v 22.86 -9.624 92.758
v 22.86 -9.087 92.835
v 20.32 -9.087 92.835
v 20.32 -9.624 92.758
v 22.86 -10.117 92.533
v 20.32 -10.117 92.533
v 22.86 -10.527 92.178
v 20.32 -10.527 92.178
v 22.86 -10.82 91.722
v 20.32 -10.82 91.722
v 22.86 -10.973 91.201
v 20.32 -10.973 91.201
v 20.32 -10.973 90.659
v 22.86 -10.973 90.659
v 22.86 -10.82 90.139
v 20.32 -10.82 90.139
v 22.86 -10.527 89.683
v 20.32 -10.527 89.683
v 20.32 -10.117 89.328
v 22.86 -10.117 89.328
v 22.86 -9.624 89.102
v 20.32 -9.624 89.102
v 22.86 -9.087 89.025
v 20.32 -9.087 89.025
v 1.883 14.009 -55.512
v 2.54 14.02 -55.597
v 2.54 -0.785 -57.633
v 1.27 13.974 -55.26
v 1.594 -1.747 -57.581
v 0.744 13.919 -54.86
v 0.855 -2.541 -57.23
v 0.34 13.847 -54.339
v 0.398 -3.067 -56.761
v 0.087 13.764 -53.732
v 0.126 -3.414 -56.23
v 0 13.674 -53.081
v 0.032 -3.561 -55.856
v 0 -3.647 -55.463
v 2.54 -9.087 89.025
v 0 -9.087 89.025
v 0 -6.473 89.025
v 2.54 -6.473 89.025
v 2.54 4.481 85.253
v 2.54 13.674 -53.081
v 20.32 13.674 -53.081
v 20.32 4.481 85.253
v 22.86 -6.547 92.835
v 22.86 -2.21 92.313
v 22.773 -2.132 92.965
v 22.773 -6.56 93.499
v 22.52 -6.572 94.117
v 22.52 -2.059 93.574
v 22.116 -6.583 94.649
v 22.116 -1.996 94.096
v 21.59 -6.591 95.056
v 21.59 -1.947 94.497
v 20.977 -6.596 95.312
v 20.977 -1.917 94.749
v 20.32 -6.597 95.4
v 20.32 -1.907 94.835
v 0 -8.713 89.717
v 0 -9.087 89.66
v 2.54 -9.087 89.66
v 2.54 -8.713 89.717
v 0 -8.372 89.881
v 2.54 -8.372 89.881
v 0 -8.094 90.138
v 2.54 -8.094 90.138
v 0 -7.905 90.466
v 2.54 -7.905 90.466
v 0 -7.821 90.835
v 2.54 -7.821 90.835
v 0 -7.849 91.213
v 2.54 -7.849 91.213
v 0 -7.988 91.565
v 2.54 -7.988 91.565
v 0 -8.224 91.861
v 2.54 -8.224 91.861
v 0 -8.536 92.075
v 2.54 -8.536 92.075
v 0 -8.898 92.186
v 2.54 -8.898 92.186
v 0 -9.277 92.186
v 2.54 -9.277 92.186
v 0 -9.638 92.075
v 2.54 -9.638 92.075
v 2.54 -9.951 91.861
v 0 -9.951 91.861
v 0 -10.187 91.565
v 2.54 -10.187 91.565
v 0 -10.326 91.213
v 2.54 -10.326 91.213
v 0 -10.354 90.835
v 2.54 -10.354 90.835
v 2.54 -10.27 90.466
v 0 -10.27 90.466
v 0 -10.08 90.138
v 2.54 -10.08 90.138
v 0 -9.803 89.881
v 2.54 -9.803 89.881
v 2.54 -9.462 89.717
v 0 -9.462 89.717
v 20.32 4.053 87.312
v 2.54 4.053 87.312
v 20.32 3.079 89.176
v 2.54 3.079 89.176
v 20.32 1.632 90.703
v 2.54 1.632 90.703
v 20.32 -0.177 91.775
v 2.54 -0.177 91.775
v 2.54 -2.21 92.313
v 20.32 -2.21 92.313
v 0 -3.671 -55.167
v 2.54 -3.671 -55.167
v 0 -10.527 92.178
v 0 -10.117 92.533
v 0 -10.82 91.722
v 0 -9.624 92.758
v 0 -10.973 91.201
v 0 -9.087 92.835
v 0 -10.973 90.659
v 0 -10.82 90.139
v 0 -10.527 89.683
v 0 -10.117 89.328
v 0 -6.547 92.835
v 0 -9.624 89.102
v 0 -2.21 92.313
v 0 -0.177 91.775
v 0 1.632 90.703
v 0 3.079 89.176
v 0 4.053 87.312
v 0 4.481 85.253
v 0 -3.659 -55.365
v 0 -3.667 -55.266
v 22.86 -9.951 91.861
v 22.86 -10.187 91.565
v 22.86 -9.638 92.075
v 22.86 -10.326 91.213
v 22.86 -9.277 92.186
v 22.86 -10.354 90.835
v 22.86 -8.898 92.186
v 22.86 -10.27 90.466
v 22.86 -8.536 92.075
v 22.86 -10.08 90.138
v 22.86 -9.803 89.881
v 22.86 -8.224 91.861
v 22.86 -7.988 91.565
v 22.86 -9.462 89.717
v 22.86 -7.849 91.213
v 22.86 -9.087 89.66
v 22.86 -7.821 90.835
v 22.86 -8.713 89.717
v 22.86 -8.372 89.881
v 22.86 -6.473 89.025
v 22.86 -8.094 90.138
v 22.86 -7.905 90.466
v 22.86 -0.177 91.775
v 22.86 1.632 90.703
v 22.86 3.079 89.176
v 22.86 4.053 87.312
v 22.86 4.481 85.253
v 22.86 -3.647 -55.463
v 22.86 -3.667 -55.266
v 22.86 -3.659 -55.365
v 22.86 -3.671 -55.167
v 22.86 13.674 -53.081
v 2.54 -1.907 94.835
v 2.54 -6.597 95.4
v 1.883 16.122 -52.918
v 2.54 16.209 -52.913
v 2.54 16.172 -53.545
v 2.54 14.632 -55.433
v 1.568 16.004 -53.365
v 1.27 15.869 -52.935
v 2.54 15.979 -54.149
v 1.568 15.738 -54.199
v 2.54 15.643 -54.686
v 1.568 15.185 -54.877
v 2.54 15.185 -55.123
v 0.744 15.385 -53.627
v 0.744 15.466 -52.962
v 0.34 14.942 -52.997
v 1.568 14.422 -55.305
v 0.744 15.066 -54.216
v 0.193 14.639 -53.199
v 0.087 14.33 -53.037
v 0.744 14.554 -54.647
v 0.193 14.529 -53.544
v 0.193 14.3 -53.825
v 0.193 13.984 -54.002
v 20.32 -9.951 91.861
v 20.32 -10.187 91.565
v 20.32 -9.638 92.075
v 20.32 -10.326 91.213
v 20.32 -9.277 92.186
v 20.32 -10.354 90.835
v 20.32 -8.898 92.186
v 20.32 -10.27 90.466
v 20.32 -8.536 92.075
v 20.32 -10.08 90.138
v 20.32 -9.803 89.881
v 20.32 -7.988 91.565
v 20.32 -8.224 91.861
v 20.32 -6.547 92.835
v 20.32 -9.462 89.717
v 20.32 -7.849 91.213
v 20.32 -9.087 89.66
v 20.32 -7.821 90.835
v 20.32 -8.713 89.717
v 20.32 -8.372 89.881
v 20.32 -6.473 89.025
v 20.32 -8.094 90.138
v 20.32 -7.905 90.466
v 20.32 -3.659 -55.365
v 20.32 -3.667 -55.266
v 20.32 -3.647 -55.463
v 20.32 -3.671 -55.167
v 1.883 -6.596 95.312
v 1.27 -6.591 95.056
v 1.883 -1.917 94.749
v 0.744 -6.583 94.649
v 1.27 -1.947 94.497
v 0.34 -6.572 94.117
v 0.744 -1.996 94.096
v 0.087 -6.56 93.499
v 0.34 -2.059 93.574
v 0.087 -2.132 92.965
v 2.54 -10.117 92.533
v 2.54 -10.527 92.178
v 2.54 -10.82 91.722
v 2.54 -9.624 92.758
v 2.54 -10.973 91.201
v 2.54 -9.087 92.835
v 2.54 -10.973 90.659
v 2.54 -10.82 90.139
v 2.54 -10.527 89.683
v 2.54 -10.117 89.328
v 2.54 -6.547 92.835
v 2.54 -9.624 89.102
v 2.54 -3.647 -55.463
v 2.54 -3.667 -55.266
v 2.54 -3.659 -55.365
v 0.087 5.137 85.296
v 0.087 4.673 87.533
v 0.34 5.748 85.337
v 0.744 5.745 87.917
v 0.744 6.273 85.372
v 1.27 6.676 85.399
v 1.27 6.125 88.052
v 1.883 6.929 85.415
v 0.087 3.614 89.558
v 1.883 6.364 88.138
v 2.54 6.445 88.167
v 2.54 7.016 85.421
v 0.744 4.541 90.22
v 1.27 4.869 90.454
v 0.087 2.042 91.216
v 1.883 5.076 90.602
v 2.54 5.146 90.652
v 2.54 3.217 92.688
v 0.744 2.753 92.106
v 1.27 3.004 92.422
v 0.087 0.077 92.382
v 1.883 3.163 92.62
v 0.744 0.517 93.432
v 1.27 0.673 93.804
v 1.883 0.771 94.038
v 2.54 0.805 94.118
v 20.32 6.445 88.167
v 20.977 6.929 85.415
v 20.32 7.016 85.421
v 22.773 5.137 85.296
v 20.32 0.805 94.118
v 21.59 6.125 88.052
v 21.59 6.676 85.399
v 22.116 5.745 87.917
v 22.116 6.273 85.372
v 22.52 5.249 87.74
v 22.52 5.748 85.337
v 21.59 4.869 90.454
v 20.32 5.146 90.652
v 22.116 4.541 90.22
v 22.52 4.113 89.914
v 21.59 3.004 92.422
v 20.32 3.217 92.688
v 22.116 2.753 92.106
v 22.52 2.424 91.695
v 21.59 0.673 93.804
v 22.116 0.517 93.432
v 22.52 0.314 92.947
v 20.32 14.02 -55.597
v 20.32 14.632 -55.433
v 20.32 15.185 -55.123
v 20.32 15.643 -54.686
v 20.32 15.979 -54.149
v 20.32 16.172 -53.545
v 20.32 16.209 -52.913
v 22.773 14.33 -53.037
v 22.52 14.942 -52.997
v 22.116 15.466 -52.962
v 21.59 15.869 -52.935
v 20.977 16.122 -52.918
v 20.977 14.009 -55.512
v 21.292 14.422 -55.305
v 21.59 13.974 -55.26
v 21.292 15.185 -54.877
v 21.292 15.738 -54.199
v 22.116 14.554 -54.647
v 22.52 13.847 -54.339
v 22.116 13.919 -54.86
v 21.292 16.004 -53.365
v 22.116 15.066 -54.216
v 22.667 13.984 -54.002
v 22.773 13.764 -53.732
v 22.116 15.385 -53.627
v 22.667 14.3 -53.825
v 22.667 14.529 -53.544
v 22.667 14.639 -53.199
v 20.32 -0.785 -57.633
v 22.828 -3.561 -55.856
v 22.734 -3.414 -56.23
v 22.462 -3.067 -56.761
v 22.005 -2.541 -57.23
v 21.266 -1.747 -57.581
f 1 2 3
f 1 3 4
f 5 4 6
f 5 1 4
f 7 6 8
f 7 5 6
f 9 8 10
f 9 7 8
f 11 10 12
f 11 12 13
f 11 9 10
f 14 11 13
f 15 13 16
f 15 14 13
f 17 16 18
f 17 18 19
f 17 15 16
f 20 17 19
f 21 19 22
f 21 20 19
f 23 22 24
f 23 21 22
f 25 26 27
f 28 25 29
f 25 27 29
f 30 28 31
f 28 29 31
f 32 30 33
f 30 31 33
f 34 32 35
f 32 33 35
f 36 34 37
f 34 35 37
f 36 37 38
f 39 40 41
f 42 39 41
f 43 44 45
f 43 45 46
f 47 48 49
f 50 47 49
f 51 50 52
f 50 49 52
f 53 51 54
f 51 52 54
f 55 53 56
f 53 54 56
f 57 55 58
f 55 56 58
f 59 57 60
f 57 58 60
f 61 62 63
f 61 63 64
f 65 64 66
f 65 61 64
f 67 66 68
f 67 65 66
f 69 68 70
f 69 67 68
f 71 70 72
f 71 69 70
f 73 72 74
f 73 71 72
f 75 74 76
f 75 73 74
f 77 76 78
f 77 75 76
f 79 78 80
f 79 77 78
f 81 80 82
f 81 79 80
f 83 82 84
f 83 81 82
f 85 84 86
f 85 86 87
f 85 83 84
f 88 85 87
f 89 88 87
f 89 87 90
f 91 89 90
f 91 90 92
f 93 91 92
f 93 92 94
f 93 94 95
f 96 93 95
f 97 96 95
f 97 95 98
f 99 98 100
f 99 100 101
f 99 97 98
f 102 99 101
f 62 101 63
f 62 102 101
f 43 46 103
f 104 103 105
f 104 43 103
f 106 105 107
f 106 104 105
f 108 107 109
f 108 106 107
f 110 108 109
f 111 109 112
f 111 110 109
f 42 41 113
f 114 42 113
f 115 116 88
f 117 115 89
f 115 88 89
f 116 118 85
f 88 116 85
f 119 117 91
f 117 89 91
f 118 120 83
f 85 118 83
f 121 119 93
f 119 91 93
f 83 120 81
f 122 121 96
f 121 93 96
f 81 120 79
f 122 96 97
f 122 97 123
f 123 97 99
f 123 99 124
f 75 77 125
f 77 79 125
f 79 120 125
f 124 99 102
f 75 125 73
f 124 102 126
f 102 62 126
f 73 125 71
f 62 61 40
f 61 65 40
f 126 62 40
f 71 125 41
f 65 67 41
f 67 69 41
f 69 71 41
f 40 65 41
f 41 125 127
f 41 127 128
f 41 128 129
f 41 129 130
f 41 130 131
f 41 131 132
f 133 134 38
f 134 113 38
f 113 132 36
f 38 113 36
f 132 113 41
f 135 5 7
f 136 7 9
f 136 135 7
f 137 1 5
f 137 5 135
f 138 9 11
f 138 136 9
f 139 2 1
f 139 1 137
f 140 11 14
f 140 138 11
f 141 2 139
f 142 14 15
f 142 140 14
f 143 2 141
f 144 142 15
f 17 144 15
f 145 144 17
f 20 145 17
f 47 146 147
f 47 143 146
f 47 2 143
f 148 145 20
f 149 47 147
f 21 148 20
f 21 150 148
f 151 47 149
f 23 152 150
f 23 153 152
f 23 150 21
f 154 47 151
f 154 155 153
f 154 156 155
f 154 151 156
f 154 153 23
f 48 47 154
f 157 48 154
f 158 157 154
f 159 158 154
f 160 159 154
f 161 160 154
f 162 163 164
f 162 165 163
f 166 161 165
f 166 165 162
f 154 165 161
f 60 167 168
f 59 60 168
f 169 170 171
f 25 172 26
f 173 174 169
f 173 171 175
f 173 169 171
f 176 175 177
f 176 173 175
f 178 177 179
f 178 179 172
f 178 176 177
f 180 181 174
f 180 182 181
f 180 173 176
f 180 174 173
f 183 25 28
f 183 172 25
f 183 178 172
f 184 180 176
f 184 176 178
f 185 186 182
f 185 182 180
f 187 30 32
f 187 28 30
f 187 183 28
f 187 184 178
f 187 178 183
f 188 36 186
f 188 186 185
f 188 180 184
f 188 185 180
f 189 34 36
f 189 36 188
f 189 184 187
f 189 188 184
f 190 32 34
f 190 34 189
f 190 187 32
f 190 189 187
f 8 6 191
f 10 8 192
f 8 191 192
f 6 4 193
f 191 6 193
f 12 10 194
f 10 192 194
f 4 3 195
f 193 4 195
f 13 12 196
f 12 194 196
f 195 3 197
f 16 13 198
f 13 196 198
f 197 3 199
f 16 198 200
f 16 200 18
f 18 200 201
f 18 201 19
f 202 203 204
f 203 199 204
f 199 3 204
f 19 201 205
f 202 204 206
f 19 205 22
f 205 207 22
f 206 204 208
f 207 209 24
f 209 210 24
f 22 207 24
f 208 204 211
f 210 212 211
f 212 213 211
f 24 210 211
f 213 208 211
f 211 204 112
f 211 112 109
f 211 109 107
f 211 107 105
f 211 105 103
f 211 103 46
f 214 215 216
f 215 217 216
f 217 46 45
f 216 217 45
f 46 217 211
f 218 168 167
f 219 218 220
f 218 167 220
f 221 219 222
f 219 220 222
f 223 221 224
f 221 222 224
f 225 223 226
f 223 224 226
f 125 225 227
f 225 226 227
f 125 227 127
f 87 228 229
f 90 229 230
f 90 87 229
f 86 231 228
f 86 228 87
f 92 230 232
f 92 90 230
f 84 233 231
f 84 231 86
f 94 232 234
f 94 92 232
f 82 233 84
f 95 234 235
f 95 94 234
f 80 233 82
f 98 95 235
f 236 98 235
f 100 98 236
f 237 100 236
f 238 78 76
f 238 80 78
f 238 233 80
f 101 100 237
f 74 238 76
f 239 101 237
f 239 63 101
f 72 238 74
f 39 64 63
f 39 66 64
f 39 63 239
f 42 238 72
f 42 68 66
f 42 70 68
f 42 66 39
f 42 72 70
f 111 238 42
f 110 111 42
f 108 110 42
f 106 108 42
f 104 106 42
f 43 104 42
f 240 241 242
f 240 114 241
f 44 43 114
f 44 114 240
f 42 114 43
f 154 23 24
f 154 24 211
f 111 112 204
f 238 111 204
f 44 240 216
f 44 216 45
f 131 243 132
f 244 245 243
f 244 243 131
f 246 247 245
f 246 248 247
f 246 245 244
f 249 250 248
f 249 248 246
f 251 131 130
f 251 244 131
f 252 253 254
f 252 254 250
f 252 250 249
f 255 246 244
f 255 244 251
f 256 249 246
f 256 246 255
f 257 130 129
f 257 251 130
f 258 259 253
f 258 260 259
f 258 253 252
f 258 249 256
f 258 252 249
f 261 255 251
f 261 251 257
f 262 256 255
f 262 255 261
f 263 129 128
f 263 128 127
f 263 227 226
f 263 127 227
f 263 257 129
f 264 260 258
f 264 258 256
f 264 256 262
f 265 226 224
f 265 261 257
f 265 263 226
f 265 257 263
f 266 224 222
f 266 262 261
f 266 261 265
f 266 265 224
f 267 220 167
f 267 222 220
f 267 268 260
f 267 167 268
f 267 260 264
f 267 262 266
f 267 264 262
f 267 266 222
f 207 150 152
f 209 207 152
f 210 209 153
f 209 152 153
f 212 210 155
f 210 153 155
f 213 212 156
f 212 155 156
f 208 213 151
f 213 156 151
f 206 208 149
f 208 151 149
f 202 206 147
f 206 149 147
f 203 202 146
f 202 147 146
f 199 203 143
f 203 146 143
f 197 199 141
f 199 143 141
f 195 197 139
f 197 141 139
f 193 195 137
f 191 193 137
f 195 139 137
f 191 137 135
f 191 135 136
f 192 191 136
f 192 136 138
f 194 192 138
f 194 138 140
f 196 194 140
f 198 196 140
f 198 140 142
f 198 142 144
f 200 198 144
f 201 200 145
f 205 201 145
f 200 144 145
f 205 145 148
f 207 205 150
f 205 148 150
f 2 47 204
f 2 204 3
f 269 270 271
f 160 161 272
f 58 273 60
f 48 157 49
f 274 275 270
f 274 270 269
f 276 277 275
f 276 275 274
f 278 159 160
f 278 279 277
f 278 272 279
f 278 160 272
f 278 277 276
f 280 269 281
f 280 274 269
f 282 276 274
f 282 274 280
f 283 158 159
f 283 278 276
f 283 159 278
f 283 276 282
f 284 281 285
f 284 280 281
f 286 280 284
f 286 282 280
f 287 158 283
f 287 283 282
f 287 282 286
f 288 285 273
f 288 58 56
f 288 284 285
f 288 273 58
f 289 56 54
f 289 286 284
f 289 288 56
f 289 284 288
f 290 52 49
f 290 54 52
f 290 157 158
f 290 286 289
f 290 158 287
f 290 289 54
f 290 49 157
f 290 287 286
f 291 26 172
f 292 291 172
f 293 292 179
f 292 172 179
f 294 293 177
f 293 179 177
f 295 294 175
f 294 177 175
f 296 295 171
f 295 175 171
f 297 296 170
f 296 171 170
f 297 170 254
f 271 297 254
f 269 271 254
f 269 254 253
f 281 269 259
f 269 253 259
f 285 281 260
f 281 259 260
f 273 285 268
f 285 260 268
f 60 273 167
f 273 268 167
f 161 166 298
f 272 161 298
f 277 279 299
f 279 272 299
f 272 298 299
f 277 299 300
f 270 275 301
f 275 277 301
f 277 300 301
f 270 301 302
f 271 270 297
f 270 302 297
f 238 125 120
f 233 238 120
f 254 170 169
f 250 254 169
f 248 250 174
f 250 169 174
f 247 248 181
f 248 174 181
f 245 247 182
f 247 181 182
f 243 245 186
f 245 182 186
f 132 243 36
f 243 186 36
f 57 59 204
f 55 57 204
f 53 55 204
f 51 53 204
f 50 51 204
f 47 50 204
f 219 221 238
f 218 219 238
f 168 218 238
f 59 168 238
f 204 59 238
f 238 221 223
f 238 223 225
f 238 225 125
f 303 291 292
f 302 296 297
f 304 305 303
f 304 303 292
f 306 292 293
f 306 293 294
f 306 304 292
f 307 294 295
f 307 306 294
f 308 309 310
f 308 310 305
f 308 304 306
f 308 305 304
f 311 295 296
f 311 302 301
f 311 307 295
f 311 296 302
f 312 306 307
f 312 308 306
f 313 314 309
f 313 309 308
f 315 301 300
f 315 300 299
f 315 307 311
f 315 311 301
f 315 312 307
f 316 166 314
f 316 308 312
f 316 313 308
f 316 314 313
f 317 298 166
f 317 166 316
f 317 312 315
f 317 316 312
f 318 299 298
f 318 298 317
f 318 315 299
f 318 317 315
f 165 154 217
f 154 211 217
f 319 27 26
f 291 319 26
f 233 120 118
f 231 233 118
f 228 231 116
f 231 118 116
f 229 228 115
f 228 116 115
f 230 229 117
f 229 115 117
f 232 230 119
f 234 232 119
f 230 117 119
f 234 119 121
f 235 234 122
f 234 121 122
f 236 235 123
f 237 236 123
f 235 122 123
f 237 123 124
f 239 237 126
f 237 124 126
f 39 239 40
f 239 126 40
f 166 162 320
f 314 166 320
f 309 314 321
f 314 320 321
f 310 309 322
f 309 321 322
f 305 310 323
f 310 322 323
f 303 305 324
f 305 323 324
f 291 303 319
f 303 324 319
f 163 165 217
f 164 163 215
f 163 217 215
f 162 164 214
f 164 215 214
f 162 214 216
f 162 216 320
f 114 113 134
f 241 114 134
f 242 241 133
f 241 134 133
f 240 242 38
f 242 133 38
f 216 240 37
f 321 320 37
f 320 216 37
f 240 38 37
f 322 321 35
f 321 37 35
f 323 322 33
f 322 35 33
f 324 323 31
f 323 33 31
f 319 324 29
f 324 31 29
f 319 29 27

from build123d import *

# Parameters (mm, degrees)
BOSS_EXTRUDE1_DEPTH = 22.86
SHELL3_T            = -2.54
SKETCH2_R           = 1.27
BOSS_EXTRUDE2_DEPTH = 2.54
FILLET2_R           = 2.54


with BuildPart() as part:
    # Sketch1 → Boss-Extrude1 (new body)
    with BuildSketch(Plane(origin=(0, 0, 0), x_dir=(0, 0, -1), z_dir=(1, 0, 0))):
        with BuildLine():
            Line((-95.3996828, -6.597201831), (58.022669589, -3.615128074))
            Line((58.022669589, -3.615128074), (55.274818438, 16.365717982))
            Line((55.274818438, 16.365717982), (-85.421209368, 7.015665501))
            ThreePointArc((-85.421209368, 7.015665501), (-91.73681654, 4.25197608), (-94.834557989, -1.906665904))
            Line((-94.834557989, -1.906665904), (-95.3996828, -6.597201831))
        make_face()
    extrude(amount=BOSS_EXTRUDE1_DEPTH)

    # Shell3
    shell3_openings = [part.faces().sort_by_distance(p)[0] for p in [
        (11.43, -5.106164953, 18.688506605),
    ]]
    offset(amount=SHELL3_T, openings=shell3_openings, kind=Kind.INTERSECTION)

    # Sketch2 → Boss-Extrude2 (add)
    with BuildSketch(Plane(origin=(22.86, 0, 0), x_dir=(0, 0, -1), z_dir=(1, 0, 0))):
        with BuildLine():
            Line((-89.025308756, -6.473302977), (-92.835308756, -6.547358034))
            Line((-92.835308756, -6.547358034), (-92.835308756, -9.087358034))
            ThreePointArc((-92.835308756, -9.087358034), (-90.930308756, -10.992358034), (-89.025308756, -9.087358034))
            Line((-89.025308756, -9.087358034), (-89.025308756, -6.473302977))
        make_face()
        with Locations((-90.930308756, -9.087358034)):
            Circle(SKETCH2_R, mode=Mode.SUBTRACT)
    boss_extrude2 = extrude(amount=-BOSS_EXTRUDE2_DEPTH)

    # Mirror1: Boss-Extrude2 across plane
    add(boss_extrude2.mirror(Plane.ZY.offset(-11.43)))

    # Fillet2
    # the kernel refuses this fillet: 2.54 mm, written as the material it takes off along each edge
    with BuildSketch(Plane(origin=(2.54, 13.674326521, -53.081043163), x_dir=(0, 0.1362419322973002, -0.9906755956840251), z_dir=(-1, 0, 0))) as fillet2_piece_1_section:
        Polygon((0, 0), (FILLET2_R, 0), (FILLET2_R, -FILLET2_R * 0.932051833184), (FILLET2_R * 0.0702509400666, -FILLET2_R * 0.997529350656), align=None)
    fillet2_piece_1 = extrude(amount=FILLET2_R, mode=Mode.PRIVATE)
    fillet2_piece_1 = fillet2_piece_1 - Plane(origin=(2.54, 13.674326521, -53.081043163), x_dir=(0, -0.7751236084755375, 0.6318096165648808), z_dir=(-1, 0, 0)) * Sphere(FILLET2_R, mode=Mode.PRIVATE)
    add(fillet2_piece_1, mode=Mode.SUBTRACT)
    with BuildSketch(Plane(origin=(20.32, 13.674326521, -53.081043163), x_dir=(0, 0.1362419322973002, -0.9906755956840251), z_dir=(1, 0, 0))) as fillet2_piece_2_section:
        Polygon((0, 0), (FILLET2_R, 0), (FILLET2_R, FILLET2_R * 0.932051833184), (FILLET2_R * 0.0702509400666, FILLET2_R * 0.997529350656), align=None)
    fillet2_piece_2 = extrude(amount=FILLET2_R, mode=Mode.PRIVATE)
    fillet2_piece_2 = fillet2_piece_2 - Plane(origin=(20.32, 13.674326521, -53.081043163), x_dir=(0, -0.7751236084755375, 0.6318096165648808), z_dir=(1, 0, 0)) * Sphere(FILLET2_R, mode=Mode.PRIVATE)
    add(fillet2_piece_2, mode=Mode.SUBTRACT)
    with BuildSketch(Plane(origin=(0, -1.906665904, 94.834557989), x_dir=(0, -0.11961688257849476, -0.992820125401476), z_dir=(0, -0.992820125401476, 0.11961688257849475))) as fillet2_piece_3:
        with BuildLine():
            CenterArc((FILLET2_R, FILLET2_R), FILLET2_R, 180, 90)
            Line((0, FILLET2_R), (0, 0))
            Line((0, 0), (FILLET2_R, 0))
        make_face()
    extrude(amount=11.074456935, mode=Mode.SUBTRACT)
    with BuildSketch(Plane(origin=(22.86, -1.906665904, 94.834557989), x_dir=(0, -0.11961688257849476, -0.992820125401476), z_dir=(0, -0.992820125401476, 0.11961688257849475))) as fillet2_piece_4:
        with BuildLine():
            CenterArc((FILLET2_R, -FILLET2_R), FILLET2_R, 90, 90)
            Line((0, -FILLET2_R), (0, 0))
            Line((0, 0), (FILLET2_R, 0))
        make_face()
    extrude(amount=11.074456935, mode=Mode.SUBTRACT)
    with BuildSketch(Plane(origin=(0, -3.121973431, 84.747505515), x_dir=(0, 0.9977991074935991, 0.06630943435874734), z_dir=(0, 0.06630943435874734, -0.9977991074935991))) as fillet2_piece_5:
        with BuildLine():
            CenterArc((10.16 - FILLET2_R, FILLET2_R), FILLET2_R, 270, 90)
            Line((10.16, FILLET2_R), (10.16, 0))
            Line((10.16, 0), (10.16 - FILLET2_R, 0))
        make_face()
    revolve(axis=Axis((0, -3.121973431, 84.747505515), (1, 0, 0)), revolution_arc=79.327967258, mode=Mode.SUBTRACT)
    with BuildSketch(Plane(origin=(22.86, -3.121973431, 84.747505515), x_dir=(0, 0.9977991074935991, 0.06630943435874734), z_dir=(0, 0.06630943435874734, -0.9977991074935991))) as fillet2_piece_6:
        with BuildLine():
            CenterArc((10.16 - FILLET2_R, -FILLET2_R), FILLET2_R, 0, 90)
            Line((10.16, -FILLET2_R), (10.16, 0))
            Line((10.16, 0), (10.16 - FILLET2_R, 0))
        make_face()
    revolve(axis=Axis((22.86, -3.121973431, 84.747505515), (1, 0, 0)), revolution_arc=79.327967258, mode=Mode.SUBTRACT)
    with BuildSketch(Plane(origin=(-7.141741608, -3.615128074, -58.022669589), x_dir=(0, 0.9906755956840251, 0.13624193229729997), z_dir=(1, 0, 0))) as fillet2_piece_7:
        with BuildLine():
            CenterArc((FILLET2_R * 1.12468371782, FILLET2_R), FILLET2_R, 173.283078214, 96.716921786)
            Line((FILLET2_R * 0.131547569233, FILLET2_R * 1.11696405589), (0, 0))
            Line((0, 0), (FILLET2_R * 1.12468371782, 0))
        make_face()
    extrude(amount=37.143483216, mode=Mode.SUBTRACT)
    with BuildSketch(Plane(origin=(0, -9.905918107, -58.887805859), x_dir=(1, 0, 0), z_dir=(0, 0.9906755956840251, 0.1362419322973002))) as fillet2_piece_8:
        with BuildLine():
            CenterArc((FILLET2_R, -FILLET2_R), FILLET2_R, 90, 90)
            Line((0, -FILLET2_R), (0, 0))
            Line((0, 0), (FILLET2_R, 0))
        make_face()
    extrude(amount=24.151497464, mode=Mode.SUBTRACT)
    with BuildSketch(Plane(origin=(22.86, -9.905918107, -58.887805859), x_dir=(-1, 0, 0), z_dir=(0, 0.9906755956840251, 0.1362419322973002))) as fillet2_piece_9:
        with BuildLine():
            CenterArc((FILLET2_R, FILLET2_R), FILLET2_R, 180, 90)
            Line((0, FILLET2_R), (0, 0))
            Line((0, 0), (FILLET2_R, 0))
        make_face()
    extrude(amount=24.151497464, mode=Mode.SUBTRACT)
    with BuildSketch(Plane(origin=(2.54, 16.365717982, -55.274818438), x_dir=(0, -0.9906755956840249, -0.13624193229730105), z_dir=(1, 0, 0))) as fillet2_piece_10:
        with BuildLine():
            CenterArc((FILLET2_R * 0.932051833184, -FILLET2_R), FILLET2_R, 90, 85.971599492)
            Line((-FILLET2_R * 0.065477517472, -FILLET2_R * 0.929749059933), (0, 0))
            Line((0, 0), (FILLET2_R * 0.932051833184, 0))
        make_face()
    extrude(amount=17.78, mode=Mode.SUBTRACT)
    with BuildSketch(Plane(origin=(0, 16.208736254, -52.9126172), x_dir=(1, 0, 0), z_dir=(0, -0.06630943435875185, 0.9977991074935989))) as fillet2_piece_11:
        with BuildLine():
            CenterArc((FILLET2_R, -FILLET2_R), FILLET2_R, 90, 90)
            Line((0, -FILLET2_R), (0, 0))
            Line((0, 0), (FILLET2_R, 0))
        make_face()
    extrude(amount=138.638956008, mode=Mode.SUBTRACT)
    with BuildSketch(Plane(origin=(22.86, 16.208736254, -52.9126172), x_dir=(-1, 0, 0), z_dir=(0, -0.06630943435875185, 0.9977991074935989))) as fillet2_piece_12:
        with BuildLine():
            CenterArc((FILLET2_R, FILLET2_R), FILLET2_R, 180, 90)
            Line((0, FILLET2_R), (0, 0))
            Line((0, 0), (FILLET2_R, 0))
        make_face()
    extrude(amount=138.638956008, mode=Mode.SUBTRACT)


solid = part.part
